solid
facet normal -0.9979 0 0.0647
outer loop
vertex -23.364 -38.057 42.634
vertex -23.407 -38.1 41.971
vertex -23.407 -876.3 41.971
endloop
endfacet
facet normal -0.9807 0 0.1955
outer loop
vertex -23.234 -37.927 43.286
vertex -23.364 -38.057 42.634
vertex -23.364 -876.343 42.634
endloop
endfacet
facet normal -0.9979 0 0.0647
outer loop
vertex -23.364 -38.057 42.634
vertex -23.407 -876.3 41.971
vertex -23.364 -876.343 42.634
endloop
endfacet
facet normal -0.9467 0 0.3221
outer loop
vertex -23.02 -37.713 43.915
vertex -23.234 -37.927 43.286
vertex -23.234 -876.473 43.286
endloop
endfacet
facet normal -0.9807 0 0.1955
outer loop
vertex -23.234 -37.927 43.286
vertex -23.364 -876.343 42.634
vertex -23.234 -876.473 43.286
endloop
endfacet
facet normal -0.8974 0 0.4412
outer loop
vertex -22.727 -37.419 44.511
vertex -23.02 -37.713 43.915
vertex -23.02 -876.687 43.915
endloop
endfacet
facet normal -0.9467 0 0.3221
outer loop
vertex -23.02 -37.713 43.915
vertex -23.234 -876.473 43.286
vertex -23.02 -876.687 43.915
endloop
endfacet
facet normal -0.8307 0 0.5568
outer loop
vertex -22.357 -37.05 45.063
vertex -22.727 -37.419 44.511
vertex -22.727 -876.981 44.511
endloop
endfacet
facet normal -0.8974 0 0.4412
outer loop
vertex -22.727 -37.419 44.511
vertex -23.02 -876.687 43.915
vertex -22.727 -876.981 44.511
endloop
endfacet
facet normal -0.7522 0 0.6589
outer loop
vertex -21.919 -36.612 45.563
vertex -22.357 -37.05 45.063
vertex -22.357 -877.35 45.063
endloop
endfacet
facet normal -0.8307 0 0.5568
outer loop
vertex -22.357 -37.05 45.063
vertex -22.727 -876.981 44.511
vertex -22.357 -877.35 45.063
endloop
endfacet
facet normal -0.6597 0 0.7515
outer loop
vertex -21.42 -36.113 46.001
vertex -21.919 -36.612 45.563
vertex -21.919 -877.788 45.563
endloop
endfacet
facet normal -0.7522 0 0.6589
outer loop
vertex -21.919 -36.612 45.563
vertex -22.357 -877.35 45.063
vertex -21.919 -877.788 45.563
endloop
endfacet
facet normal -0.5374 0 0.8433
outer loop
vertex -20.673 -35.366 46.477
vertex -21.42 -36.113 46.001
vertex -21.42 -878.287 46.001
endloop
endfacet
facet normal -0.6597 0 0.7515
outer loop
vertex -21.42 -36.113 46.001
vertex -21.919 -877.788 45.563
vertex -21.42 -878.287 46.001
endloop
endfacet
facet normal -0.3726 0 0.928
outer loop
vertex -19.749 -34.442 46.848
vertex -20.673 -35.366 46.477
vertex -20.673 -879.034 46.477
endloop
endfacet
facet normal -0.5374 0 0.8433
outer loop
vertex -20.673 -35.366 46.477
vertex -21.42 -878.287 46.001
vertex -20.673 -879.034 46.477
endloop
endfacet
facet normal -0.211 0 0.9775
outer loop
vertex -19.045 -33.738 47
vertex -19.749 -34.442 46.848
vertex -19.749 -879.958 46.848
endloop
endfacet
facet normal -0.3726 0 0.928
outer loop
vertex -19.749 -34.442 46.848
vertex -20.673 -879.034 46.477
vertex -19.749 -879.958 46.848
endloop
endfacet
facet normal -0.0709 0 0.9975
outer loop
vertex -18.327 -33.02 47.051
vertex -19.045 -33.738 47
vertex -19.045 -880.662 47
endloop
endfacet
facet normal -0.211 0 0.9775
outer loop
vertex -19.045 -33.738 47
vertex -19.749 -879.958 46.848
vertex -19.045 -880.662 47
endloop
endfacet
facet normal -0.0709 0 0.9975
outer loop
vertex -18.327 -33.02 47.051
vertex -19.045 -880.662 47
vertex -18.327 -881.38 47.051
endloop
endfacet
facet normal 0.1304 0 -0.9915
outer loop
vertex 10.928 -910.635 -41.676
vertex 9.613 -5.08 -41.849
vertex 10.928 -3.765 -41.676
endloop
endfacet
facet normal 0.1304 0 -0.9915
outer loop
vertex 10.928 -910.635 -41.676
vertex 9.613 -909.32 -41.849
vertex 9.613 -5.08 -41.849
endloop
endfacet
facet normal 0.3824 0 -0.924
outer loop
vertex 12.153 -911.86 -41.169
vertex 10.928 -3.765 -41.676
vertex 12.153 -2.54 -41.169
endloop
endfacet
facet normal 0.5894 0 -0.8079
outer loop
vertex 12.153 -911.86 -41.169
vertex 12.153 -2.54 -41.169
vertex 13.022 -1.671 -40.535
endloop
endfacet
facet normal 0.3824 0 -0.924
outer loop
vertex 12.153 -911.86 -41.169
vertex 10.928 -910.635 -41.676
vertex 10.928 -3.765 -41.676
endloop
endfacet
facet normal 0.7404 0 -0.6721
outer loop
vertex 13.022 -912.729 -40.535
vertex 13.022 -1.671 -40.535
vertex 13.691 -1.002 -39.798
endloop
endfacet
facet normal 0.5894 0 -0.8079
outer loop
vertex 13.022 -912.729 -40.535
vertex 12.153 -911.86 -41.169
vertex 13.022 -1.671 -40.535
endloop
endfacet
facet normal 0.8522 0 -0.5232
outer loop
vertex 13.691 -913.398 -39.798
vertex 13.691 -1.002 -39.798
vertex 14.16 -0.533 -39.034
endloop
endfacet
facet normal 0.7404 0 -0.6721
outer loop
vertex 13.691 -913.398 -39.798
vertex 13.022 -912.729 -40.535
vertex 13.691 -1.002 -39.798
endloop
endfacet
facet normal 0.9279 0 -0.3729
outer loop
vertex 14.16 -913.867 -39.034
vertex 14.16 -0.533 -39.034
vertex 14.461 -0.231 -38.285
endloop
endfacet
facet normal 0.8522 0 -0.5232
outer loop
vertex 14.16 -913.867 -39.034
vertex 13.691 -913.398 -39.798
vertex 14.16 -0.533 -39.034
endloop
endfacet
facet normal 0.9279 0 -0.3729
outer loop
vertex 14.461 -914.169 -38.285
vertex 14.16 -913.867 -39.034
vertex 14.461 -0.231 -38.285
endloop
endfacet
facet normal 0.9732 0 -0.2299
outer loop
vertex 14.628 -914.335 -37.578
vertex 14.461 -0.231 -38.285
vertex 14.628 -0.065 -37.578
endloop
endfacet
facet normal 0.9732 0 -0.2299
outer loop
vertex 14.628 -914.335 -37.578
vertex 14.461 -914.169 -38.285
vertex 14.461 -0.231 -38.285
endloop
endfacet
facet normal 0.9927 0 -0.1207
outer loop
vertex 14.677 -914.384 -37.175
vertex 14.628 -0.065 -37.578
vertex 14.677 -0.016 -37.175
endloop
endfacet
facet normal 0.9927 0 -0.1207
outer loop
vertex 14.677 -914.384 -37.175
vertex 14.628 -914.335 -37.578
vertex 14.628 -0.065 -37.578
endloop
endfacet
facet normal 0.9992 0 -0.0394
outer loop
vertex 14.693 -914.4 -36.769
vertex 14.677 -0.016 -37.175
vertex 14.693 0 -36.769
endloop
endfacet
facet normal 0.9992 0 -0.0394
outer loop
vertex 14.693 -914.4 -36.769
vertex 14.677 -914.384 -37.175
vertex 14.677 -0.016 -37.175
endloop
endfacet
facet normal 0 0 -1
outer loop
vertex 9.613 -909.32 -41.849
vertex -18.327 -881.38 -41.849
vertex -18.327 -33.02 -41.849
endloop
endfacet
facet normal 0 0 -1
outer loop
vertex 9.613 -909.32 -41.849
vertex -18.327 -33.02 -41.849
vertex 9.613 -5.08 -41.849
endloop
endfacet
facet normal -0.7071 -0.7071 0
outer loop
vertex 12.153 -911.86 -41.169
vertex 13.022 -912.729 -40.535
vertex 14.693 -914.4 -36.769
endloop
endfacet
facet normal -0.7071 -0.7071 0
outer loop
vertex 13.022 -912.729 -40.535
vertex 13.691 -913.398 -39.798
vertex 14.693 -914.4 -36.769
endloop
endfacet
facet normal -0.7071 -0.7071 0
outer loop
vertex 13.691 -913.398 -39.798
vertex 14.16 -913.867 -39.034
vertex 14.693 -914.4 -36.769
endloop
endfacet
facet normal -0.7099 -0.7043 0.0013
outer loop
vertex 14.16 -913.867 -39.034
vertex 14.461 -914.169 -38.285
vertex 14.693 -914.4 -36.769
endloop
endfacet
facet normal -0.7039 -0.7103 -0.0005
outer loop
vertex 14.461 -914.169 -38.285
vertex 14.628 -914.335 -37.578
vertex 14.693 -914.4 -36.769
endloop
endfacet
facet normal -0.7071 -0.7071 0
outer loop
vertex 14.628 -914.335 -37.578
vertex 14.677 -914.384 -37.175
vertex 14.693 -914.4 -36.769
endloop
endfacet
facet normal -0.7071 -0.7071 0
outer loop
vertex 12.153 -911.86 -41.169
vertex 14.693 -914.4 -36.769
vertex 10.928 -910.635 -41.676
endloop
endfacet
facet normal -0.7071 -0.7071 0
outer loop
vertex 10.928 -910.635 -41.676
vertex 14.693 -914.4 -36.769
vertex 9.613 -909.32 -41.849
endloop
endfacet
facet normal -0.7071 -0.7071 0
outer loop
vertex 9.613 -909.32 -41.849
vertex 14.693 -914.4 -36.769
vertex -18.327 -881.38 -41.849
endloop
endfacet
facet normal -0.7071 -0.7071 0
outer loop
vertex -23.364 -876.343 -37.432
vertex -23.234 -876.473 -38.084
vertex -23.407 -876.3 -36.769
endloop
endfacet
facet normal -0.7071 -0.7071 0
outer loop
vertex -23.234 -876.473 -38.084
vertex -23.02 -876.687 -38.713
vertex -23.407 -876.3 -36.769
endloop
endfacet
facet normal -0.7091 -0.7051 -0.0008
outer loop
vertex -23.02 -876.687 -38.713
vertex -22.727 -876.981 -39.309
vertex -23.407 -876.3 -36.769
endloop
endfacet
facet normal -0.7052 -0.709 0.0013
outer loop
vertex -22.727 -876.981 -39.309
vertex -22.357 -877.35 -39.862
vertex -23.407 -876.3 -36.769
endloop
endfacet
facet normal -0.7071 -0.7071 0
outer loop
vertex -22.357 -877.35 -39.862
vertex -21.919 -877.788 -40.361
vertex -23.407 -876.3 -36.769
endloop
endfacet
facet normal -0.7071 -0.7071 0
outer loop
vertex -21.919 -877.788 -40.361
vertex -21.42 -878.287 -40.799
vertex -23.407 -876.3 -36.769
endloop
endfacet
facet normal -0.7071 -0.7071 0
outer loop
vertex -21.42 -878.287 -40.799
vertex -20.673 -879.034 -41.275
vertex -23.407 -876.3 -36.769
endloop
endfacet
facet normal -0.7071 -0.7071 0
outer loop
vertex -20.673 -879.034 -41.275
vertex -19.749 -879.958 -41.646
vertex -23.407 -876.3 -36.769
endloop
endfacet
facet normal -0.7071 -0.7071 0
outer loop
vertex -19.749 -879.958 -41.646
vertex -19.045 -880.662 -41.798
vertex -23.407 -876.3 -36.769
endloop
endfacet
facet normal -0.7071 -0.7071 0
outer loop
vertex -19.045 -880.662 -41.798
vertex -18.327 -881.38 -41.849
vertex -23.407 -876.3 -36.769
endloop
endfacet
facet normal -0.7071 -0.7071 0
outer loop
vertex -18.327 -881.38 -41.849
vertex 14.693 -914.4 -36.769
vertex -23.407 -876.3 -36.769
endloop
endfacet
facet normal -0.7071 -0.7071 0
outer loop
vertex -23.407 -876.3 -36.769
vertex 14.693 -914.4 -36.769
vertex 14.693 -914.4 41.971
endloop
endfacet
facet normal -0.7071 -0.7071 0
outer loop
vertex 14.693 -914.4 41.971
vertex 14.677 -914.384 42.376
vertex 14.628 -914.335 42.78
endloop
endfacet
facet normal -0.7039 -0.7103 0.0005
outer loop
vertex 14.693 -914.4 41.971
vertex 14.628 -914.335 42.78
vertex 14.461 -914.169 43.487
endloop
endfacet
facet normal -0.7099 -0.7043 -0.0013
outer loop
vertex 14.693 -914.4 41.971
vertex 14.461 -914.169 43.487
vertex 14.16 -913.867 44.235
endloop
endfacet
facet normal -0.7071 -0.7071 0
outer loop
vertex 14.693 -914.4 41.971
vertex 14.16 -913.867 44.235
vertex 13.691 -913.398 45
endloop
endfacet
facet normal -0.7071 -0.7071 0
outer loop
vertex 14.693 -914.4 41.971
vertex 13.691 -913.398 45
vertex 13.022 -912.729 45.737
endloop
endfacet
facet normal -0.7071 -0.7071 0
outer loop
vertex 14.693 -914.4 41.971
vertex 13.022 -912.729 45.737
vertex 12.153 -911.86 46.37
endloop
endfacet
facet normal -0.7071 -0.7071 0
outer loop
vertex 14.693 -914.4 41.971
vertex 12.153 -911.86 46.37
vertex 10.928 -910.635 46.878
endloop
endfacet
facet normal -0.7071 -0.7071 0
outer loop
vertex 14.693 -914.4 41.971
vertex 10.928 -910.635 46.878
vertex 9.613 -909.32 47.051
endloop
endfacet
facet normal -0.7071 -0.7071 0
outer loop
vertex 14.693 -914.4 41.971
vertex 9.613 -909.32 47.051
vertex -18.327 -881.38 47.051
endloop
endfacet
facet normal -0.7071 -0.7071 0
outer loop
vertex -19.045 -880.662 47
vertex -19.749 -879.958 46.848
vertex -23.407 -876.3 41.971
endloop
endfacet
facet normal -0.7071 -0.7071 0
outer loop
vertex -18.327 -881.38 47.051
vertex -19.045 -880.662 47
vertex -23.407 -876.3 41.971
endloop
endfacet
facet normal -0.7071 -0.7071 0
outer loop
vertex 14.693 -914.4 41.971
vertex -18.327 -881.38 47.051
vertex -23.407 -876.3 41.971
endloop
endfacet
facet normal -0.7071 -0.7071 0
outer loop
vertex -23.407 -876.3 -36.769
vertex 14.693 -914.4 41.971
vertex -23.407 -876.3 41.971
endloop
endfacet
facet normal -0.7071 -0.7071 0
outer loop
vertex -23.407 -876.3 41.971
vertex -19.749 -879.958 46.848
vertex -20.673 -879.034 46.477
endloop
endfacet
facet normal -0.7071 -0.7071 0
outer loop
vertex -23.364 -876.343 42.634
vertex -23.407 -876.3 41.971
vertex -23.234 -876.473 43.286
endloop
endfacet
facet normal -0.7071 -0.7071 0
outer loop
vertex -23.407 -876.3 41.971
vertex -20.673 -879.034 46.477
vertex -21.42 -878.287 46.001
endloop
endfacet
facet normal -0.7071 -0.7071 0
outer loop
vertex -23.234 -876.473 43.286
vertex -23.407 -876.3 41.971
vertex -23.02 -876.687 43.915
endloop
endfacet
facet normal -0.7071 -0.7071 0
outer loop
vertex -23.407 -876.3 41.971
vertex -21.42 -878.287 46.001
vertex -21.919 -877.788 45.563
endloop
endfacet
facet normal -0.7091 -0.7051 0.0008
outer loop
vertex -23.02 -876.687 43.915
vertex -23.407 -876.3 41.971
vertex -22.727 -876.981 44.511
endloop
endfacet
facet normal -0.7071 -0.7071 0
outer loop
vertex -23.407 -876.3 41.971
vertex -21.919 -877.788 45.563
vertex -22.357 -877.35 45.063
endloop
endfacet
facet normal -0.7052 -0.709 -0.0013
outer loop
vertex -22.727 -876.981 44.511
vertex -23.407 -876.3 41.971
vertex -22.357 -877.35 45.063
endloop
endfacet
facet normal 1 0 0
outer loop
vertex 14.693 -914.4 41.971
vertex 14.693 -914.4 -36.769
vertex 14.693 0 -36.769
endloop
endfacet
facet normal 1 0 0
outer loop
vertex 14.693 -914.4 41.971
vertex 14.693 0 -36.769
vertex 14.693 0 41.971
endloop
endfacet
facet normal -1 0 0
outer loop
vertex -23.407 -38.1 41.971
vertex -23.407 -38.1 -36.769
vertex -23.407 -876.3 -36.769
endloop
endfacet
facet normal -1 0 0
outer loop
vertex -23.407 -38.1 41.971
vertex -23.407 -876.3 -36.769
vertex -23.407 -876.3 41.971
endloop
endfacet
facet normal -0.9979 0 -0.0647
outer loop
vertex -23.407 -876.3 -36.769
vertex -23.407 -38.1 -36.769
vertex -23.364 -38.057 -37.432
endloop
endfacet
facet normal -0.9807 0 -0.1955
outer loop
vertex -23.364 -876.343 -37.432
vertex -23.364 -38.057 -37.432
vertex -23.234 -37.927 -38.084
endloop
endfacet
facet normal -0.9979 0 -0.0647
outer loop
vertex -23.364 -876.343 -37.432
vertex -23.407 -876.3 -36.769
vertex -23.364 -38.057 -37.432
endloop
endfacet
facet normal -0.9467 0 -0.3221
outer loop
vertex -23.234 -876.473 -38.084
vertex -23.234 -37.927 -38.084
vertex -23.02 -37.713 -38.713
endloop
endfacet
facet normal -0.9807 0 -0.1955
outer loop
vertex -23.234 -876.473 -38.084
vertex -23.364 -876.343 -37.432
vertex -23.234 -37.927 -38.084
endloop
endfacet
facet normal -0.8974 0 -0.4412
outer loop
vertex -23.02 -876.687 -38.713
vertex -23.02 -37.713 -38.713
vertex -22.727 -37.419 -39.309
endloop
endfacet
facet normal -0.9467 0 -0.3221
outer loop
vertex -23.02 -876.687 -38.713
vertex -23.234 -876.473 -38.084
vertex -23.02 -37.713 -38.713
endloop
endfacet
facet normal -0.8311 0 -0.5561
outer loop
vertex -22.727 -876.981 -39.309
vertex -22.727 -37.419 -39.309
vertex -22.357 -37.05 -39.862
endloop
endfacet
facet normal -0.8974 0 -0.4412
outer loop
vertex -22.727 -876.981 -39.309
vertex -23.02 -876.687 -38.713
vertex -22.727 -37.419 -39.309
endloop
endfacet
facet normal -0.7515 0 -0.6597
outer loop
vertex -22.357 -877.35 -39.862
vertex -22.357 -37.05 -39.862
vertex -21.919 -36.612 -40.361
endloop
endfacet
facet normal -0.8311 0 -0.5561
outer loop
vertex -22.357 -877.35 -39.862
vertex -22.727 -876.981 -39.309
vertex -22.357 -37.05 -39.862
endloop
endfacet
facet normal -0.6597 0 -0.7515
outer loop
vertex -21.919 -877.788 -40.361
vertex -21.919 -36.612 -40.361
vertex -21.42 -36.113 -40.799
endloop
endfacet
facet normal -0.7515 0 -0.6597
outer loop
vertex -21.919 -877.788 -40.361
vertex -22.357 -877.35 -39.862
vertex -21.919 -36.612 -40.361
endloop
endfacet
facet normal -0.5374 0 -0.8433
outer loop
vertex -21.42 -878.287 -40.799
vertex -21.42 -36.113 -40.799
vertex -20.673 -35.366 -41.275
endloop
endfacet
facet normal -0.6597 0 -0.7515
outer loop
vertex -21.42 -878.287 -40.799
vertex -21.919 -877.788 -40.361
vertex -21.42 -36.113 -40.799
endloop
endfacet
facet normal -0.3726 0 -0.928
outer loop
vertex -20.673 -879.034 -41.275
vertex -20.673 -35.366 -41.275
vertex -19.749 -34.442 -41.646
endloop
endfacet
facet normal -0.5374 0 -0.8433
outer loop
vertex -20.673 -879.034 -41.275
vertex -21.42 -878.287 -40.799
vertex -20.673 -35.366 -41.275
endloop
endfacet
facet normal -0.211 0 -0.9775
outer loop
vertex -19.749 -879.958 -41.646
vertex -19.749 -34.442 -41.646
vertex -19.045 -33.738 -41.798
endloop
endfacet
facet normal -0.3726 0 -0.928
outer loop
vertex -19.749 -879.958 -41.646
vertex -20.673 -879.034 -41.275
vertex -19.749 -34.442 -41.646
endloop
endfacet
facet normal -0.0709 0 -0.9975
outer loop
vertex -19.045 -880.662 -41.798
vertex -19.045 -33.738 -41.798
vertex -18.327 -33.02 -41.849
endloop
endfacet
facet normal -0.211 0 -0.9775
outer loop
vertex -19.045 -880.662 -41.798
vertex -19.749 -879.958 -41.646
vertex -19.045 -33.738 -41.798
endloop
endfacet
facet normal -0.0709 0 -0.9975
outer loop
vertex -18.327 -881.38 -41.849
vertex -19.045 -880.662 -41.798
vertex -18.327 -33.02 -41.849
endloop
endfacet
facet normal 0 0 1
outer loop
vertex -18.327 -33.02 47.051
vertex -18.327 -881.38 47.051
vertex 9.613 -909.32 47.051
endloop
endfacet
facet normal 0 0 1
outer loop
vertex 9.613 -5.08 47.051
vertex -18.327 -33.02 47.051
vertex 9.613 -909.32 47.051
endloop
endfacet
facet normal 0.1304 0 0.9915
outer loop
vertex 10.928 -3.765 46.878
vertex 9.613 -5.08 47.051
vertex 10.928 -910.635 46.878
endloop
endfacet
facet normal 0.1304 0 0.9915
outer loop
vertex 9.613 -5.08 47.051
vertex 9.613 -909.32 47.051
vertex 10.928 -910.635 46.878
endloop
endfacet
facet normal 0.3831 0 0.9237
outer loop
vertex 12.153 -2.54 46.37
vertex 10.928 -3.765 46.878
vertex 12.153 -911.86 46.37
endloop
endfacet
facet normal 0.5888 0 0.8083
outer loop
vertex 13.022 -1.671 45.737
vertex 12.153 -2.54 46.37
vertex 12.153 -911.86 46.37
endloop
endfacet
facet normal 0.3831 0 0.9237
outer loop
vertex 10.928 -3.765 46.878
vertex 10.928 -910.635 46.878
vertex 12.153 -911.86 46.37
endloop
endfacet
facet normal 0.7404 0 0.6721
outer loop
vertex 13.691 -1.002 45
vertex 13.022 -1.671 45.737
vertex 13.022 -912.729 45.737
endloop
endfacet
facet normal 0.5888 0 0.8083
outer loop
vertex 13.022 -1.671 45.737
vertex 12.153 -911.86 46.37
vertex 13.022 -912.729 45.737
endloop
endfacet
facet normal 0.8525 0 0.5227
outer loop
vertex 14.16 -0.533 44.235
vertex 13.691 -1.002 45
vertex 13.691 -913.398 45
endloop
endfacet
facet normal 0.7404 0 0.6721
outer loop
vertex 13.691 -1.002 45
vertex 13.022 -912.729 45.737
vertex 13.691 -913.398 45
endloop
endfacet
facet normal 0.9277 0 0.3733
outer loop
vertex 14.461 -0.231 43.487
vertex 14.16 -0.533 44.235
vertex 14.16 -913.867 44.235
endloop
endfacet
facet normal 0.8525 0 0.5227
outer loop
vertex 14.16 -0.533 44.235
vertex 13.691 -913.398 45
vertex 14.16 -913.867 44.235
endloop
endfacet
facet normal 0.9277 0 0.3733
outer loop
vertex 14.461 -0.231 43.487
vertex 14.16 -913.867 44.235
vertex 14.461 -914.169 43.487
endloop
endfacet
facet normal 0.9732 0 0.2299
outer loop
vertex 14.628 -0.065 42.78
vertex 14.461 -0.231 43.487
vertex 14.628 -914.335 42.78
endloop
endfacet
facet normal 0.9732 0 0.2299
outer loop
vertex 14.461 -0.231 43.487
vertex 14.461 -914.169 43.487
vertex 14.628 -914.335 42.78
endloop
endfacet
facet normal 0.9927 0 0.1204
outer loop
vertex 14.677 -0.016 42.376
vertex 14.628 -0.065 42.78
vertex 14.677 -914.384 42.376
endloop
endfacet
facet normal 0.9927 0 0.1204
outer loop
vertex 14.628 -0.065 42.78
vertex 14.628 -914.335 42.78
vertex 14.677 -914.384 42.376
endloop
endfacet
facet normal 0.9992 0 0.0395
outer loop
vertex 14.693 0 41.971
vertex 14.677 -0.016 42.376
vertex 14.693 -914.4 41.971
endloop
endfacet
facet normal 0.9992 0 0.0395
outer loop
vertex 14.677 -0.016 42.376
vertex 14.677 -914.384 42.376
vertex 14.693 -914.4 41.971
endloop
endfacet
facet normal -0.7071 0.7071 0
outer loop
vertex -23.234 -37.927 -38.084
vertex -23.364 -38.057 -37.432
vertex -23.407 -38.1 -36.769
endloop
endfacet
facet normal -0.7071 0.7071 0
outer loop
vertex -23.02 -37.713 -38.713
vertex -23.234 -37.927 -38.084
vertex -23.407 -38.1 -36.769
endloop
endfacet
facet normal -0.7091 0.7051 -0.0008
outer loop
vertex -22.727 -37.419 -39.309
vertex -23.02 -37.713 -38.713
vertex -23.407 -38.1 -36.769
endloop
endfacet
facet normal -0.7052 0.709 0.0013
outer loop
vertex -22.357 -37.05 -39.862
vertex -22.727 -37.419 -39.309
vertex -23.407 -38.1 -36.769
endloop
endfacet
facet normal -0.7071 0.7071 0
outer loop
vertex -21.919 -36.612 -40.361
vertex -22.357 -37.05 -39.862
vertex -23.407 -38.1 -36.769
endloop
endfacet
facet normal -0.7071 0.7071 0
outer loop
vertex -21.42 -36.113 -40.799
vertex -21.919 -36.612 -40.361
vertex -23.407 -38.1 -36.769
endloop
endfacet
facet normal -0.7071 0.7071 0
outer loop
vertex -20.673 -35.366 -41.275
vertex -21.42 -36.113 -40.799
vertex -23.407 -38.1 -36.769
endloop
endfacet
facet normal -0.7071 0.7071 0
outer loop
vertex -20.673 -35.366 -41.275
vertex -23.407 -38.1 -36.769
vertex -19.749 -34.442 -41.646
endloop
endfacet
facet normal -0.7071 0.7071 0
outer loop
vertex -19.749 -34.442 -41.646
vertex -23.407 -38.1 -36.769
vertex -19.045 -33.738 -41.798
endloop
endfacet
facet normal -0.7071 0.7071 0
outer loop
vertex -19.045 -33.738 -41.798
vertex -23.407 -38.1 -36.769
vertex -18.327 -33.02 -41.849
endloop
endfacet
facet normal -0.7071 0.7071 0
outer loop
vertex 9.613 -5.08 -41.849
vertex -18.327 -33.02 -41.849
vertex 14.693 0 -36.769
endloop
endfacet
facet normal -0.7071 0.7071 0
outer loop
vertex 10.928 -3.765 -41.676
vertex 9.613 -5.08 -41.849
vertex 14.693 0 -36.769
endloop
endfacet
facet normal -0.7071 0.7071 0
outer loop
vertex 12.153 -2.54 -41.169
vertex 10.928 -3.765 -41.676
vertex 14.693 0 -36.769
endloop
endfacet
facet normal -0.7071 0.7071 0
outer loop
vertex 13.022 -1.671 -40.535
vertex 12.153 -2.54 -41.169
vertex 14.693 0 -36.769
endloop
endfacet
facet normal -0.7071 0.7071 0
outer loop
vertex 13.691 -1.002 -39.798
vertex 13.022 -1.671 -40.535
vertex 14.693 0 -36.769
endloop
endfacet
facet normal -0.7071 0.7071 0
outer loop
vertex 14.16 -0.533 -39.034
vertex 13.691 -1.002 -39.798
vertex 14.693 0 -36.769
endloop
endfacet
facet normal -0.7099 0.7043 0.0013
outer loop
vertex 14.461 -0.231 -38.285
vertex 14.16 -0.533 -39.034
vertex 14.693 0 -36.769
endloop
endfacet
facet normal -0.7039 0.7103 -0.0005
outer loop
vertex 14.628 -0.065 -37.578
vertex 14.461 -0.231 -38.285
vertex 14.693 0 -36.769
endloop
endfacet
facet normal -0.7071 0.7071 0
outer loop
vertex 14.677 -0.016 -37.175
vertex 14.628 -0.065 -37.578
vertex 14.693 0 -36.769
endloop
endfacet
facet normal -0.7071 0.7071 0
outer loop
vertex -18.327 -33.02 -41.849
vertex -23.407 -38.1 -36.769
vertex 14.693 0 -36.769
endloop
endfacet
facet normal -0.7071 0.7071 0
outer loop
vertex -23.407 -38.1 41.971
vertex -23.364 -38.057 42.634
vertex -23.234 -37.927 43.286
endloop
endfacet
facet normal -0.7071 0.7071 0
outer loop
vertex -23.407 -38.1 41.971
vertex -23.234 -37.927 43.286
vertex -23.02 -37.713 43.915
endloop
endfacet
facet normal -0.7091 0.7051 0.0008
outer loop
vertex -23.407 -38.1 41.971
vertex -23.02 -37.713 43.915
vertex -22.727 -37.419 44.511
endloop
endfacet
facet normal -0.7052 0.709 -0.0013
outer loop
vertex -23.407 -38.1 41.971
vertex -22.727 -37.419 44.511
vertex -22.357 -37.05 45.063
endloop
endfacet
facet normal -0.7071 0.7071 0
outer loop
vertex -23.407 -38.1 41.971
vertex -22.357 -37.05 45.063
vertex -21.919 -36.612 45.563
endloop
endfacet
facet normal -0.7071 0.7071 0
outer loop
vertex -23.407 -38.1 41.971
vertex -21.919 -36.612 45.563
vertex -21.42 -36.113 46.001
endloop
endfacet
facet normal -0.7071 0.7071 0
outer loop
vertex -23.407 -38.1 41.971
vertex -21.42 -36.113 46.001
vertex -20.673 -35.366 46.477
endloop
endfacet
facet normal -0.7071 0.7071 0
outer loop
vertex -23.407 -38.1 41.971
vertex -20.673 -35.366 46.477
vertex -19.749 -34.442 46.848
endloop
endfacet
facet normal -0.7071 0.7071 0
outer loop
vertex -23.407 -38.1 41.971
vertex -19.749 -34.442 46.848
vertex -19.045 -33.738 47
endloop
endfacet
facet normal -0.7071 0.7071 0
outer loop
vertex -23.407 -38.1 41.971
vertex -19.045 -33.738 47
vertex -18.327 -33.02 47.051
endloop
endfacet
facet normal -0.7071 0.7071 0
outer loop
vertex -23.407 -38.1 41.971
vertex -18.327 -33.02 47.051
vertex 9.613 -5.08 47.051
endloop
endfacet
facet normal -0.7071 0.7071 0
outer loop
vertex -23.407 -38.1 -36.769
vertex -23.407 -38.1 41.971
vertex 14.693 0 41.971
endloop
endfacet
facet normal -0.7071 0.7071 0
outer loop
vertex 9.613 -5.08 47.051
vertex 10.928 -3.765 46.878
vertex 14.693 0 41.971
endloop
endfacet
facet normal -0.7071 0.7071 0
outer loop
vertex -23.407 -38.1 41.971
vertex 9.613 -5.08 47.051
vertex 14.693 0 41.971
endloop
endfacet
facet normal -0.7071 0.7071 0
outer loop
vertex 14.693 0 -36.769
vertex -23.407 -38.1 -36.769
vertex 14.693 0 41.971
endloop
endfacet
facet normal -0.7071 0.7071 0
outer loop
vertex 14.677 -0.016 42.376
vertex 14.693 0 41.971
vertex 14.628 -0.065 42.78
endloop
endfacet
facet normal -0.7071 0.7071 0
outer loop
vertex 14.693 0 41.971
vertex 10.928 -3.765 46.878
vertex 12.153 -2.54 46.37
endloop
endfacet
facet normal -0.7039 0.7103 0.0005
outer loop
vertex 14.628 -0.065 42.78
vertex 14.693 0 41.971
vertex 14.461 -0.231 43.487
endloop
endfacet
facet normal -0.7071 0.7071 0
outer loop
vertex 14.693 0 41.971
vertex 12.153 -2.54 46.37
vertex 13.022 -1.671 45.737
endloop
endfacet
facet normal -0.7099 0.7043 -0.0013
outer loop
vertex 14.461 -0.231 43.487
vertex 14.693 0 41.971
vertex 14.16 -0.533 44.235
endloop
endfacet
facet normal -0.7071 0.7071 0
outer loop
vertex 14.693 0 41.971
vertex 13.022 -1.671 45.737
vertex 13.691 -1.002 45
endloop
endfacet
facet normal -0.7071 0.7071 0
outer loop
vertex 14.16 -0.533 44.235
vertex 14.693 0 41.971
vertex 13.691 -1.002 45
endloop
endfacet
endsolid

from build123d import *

# Parameters (mm, degrees)
F0_W     = 38.1
F0_H     = 88.9
F1_DEPTH = 914.4
F3_DEPTH = 88.9
F4_R     = 5.08


with BuildPart() as f1:
    # F0 (on Front) → F1 (new body)
    with BuildSketch(Plane.XZ):
        with Locations((-4.357182, 2.600797)):
            Rectangle(F0_W, F0_H)
    extrude(amount=F1_DEPTH)

    # F2 (on face) → F3 (cut)
    with BuildSketch(Plane.XY.offset(47.050797)):
        Polygon((-23.407182, -914.4), (14.692818, -914.4), (-23.407182, -876.3), align=None)
        Polygon((-23.407182, -38.1), (14.692818, 0), (-23.407182, 0), align=None)
    extrude(amount=-F3_DEPTH, mode=Mode.SUBTRACT)

    # F4
    f4_edges = [f1.edges().sort_by_distance(p)[0] for p in [
        (-23.407182, -457.2, 47.050797),
        (14.692818, -457.2, 47.050797),
        (-23.407182, -457.2, -41.849203),
        (14.692818, -457.2, -41.849203),
    ]]
    fillet(f4_edges, radius=F4_R)


solid = f1.part
